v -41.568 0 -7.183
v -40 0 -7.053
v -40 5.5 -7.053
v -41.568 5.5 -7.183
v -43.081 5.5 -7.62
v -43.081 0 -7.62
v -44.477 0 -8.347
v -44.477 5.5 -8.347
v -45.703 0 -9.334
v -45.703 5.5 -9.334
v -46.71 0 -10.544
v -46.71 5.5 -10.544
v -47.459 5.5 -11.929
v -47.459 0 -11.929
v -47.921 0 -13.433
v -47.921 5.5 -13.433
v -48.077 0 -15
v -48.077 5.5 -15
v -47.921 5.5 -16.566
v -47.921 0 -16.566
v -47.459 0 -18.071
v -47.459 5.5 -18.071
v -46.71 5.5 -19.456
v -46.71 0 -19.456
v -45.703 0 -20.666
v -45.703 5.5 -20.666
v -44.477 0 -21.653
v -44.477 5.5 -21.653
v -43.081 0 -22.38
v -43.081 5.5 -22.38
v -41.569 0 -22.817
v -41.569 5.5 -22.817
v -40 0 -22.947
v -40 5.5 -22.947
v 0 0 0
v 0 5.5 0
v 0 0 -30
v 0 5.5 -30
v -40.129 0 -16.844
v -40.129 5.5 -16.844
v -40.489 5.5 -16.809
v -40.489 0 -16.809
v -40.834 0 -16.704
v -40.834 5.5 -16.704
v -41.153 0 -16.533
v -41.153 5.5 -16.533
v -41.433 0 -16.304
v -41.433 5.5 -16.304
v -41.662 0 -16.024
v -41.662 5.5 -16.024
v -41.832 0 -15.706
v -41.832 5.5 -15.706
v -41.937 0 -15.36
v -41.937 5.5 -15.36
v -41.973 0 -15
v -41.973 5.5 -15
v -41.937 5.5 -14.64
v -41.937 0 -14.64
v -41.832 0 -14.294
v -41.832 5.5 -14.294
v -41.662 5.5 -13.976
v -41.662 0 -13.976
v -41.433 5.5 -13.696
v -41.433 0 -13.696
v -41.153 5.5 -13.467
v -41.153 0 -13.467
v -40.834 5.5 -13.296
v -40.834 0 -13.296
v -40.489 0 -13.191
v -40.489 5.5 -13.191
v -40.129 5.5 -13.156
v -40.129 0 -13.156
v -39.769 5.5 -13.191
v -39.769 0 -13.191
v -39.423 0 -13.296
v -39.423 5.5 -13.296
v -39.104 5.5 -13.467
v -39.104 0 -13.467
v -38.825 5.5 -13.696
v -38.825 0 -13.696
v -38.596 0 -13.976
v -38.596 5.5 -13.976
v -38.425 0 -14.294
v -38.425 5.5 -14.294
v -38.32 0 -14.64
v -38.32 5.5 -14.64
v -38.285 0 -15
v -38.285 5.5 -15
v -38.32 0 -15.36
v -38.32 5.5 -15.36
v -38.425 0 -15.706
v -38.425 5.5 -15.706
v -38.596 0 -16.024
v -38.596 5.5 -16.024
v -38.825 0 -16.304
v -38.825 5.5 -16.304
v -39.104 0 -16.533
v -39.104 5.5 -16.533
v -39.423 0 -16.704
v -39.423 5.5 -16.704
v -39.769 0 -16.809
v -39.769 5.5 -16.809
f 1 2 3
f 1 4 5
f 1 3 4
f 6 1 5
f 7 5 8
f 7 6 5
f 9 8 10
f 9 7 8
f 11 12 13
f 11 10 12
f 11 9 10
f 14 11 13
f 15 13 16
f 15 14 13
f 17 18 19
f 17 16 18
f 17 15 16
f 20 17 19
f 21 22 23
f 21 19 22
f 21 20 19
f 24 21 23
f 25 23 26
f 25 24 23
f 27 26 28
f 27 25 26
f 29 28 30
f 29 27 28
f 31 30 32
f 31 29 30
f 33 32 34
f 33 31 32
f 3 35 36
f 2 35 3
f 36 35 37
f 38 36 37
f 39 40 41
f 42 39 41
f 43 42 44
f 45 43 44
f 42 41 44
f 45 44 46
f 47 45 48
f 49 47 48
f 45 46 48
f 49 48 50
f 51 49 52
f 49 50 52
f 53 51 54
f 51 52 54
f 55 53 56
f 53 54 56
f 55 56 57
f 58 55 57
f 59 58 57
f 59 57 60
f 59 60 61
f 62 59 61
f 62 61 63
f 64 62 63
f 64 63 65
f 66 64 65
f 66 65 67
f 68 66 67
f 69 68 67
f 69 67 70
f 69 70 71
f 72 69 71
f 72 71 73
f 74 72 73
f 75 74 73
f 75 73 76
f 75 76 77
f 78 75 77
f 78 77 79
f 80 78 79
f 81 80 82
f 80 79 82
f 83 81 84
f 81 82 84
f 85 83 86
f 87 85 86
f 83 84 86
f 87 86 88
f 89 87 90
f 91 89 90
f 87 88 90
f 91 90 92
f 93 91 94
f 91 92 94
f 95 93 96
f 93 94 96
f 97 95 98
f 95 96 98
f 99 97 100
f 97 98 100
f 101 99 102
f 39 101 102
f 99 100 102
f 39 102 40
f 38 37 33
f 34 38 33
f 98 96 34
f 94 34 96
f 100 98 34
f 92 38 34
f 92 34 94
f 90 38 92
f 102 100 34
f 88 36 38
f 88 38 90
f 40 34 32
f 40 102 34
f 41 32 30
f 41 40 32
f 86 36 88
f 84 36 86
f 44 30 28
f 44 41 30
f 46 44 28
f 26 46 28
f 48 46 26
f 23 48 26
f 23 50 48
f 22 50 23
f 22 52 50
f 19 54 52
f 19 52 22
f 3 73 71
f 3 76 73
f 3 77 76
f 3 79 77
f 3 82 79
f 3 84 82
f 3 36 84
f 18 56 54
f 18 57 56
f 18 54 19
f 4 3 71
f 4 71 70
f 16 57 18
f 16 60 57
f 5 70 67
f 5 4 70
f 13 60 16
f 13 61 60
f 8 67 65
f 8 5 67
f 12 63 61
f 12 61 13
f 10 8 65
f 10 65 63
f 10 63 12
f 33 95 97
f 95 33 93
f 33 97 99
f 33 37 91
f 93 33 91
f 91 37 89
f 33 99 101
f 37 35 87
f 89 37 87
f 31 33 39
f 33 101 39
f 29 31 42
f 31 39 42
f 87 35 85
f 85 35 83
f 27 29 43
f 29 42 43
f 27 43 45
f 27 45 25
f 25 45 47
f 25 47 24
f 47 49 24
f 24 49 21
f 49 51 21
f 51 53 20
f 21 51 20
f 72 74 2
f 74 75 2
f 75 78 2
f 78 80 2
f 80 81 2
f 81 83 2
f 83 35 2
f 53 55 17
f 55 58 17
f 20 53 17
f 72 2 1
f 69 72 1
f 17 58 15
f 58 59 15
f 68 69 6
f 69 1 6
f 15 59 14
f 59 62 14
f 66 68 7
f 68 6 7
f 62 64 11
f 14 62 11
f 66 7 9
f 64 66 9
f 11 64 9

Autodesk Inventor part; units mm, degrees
ref_plane "YZ Plane" through (0, 0, 0) normal (1, 0, 0) x (0, 1, 0)
ref_plane "XZ Plane" through (0, 0, 0) normal (0, 1, 0) x (-1, 0, 0)
ref_plane "XY Plane" through (0, 0, 0) normal (0, 0, 1) x (1, 0, 0)
sketch "Sketch1" plane through (0, 0, 0) normal (0, 1, 0) x (-1, 0, 0)
  line L0 (0, 0) -> (0, -30)
  line L1 (0, 0) -> (39.9996, -7.053)
  line L2 (0, -30) -> (39.9998, -22.947)
  arc A0 (39.9998, -22.947) -> (39.9996, -7.053) centre (40.1288, -15) ccw
  dimension "d0" = 30
  dimension "d1" = 80
  dimension "d4" = 80
  dimension "d7" = 15.896
  dimension "d9" = 40.1288
  dimension "d10" = 7.8038
extrude "Extrusion1" add sketch "Sketch1" along normal blind 5.5
hole "Hole1" at (-40.1288, 0, -15) direction (0, 1, 0) diameter 3.6881 depth 13 tip angle 118 thread size "M4.5x0.75" class "6H" standard "ISO Metric profile"
properties part number "wea abajo movil"
